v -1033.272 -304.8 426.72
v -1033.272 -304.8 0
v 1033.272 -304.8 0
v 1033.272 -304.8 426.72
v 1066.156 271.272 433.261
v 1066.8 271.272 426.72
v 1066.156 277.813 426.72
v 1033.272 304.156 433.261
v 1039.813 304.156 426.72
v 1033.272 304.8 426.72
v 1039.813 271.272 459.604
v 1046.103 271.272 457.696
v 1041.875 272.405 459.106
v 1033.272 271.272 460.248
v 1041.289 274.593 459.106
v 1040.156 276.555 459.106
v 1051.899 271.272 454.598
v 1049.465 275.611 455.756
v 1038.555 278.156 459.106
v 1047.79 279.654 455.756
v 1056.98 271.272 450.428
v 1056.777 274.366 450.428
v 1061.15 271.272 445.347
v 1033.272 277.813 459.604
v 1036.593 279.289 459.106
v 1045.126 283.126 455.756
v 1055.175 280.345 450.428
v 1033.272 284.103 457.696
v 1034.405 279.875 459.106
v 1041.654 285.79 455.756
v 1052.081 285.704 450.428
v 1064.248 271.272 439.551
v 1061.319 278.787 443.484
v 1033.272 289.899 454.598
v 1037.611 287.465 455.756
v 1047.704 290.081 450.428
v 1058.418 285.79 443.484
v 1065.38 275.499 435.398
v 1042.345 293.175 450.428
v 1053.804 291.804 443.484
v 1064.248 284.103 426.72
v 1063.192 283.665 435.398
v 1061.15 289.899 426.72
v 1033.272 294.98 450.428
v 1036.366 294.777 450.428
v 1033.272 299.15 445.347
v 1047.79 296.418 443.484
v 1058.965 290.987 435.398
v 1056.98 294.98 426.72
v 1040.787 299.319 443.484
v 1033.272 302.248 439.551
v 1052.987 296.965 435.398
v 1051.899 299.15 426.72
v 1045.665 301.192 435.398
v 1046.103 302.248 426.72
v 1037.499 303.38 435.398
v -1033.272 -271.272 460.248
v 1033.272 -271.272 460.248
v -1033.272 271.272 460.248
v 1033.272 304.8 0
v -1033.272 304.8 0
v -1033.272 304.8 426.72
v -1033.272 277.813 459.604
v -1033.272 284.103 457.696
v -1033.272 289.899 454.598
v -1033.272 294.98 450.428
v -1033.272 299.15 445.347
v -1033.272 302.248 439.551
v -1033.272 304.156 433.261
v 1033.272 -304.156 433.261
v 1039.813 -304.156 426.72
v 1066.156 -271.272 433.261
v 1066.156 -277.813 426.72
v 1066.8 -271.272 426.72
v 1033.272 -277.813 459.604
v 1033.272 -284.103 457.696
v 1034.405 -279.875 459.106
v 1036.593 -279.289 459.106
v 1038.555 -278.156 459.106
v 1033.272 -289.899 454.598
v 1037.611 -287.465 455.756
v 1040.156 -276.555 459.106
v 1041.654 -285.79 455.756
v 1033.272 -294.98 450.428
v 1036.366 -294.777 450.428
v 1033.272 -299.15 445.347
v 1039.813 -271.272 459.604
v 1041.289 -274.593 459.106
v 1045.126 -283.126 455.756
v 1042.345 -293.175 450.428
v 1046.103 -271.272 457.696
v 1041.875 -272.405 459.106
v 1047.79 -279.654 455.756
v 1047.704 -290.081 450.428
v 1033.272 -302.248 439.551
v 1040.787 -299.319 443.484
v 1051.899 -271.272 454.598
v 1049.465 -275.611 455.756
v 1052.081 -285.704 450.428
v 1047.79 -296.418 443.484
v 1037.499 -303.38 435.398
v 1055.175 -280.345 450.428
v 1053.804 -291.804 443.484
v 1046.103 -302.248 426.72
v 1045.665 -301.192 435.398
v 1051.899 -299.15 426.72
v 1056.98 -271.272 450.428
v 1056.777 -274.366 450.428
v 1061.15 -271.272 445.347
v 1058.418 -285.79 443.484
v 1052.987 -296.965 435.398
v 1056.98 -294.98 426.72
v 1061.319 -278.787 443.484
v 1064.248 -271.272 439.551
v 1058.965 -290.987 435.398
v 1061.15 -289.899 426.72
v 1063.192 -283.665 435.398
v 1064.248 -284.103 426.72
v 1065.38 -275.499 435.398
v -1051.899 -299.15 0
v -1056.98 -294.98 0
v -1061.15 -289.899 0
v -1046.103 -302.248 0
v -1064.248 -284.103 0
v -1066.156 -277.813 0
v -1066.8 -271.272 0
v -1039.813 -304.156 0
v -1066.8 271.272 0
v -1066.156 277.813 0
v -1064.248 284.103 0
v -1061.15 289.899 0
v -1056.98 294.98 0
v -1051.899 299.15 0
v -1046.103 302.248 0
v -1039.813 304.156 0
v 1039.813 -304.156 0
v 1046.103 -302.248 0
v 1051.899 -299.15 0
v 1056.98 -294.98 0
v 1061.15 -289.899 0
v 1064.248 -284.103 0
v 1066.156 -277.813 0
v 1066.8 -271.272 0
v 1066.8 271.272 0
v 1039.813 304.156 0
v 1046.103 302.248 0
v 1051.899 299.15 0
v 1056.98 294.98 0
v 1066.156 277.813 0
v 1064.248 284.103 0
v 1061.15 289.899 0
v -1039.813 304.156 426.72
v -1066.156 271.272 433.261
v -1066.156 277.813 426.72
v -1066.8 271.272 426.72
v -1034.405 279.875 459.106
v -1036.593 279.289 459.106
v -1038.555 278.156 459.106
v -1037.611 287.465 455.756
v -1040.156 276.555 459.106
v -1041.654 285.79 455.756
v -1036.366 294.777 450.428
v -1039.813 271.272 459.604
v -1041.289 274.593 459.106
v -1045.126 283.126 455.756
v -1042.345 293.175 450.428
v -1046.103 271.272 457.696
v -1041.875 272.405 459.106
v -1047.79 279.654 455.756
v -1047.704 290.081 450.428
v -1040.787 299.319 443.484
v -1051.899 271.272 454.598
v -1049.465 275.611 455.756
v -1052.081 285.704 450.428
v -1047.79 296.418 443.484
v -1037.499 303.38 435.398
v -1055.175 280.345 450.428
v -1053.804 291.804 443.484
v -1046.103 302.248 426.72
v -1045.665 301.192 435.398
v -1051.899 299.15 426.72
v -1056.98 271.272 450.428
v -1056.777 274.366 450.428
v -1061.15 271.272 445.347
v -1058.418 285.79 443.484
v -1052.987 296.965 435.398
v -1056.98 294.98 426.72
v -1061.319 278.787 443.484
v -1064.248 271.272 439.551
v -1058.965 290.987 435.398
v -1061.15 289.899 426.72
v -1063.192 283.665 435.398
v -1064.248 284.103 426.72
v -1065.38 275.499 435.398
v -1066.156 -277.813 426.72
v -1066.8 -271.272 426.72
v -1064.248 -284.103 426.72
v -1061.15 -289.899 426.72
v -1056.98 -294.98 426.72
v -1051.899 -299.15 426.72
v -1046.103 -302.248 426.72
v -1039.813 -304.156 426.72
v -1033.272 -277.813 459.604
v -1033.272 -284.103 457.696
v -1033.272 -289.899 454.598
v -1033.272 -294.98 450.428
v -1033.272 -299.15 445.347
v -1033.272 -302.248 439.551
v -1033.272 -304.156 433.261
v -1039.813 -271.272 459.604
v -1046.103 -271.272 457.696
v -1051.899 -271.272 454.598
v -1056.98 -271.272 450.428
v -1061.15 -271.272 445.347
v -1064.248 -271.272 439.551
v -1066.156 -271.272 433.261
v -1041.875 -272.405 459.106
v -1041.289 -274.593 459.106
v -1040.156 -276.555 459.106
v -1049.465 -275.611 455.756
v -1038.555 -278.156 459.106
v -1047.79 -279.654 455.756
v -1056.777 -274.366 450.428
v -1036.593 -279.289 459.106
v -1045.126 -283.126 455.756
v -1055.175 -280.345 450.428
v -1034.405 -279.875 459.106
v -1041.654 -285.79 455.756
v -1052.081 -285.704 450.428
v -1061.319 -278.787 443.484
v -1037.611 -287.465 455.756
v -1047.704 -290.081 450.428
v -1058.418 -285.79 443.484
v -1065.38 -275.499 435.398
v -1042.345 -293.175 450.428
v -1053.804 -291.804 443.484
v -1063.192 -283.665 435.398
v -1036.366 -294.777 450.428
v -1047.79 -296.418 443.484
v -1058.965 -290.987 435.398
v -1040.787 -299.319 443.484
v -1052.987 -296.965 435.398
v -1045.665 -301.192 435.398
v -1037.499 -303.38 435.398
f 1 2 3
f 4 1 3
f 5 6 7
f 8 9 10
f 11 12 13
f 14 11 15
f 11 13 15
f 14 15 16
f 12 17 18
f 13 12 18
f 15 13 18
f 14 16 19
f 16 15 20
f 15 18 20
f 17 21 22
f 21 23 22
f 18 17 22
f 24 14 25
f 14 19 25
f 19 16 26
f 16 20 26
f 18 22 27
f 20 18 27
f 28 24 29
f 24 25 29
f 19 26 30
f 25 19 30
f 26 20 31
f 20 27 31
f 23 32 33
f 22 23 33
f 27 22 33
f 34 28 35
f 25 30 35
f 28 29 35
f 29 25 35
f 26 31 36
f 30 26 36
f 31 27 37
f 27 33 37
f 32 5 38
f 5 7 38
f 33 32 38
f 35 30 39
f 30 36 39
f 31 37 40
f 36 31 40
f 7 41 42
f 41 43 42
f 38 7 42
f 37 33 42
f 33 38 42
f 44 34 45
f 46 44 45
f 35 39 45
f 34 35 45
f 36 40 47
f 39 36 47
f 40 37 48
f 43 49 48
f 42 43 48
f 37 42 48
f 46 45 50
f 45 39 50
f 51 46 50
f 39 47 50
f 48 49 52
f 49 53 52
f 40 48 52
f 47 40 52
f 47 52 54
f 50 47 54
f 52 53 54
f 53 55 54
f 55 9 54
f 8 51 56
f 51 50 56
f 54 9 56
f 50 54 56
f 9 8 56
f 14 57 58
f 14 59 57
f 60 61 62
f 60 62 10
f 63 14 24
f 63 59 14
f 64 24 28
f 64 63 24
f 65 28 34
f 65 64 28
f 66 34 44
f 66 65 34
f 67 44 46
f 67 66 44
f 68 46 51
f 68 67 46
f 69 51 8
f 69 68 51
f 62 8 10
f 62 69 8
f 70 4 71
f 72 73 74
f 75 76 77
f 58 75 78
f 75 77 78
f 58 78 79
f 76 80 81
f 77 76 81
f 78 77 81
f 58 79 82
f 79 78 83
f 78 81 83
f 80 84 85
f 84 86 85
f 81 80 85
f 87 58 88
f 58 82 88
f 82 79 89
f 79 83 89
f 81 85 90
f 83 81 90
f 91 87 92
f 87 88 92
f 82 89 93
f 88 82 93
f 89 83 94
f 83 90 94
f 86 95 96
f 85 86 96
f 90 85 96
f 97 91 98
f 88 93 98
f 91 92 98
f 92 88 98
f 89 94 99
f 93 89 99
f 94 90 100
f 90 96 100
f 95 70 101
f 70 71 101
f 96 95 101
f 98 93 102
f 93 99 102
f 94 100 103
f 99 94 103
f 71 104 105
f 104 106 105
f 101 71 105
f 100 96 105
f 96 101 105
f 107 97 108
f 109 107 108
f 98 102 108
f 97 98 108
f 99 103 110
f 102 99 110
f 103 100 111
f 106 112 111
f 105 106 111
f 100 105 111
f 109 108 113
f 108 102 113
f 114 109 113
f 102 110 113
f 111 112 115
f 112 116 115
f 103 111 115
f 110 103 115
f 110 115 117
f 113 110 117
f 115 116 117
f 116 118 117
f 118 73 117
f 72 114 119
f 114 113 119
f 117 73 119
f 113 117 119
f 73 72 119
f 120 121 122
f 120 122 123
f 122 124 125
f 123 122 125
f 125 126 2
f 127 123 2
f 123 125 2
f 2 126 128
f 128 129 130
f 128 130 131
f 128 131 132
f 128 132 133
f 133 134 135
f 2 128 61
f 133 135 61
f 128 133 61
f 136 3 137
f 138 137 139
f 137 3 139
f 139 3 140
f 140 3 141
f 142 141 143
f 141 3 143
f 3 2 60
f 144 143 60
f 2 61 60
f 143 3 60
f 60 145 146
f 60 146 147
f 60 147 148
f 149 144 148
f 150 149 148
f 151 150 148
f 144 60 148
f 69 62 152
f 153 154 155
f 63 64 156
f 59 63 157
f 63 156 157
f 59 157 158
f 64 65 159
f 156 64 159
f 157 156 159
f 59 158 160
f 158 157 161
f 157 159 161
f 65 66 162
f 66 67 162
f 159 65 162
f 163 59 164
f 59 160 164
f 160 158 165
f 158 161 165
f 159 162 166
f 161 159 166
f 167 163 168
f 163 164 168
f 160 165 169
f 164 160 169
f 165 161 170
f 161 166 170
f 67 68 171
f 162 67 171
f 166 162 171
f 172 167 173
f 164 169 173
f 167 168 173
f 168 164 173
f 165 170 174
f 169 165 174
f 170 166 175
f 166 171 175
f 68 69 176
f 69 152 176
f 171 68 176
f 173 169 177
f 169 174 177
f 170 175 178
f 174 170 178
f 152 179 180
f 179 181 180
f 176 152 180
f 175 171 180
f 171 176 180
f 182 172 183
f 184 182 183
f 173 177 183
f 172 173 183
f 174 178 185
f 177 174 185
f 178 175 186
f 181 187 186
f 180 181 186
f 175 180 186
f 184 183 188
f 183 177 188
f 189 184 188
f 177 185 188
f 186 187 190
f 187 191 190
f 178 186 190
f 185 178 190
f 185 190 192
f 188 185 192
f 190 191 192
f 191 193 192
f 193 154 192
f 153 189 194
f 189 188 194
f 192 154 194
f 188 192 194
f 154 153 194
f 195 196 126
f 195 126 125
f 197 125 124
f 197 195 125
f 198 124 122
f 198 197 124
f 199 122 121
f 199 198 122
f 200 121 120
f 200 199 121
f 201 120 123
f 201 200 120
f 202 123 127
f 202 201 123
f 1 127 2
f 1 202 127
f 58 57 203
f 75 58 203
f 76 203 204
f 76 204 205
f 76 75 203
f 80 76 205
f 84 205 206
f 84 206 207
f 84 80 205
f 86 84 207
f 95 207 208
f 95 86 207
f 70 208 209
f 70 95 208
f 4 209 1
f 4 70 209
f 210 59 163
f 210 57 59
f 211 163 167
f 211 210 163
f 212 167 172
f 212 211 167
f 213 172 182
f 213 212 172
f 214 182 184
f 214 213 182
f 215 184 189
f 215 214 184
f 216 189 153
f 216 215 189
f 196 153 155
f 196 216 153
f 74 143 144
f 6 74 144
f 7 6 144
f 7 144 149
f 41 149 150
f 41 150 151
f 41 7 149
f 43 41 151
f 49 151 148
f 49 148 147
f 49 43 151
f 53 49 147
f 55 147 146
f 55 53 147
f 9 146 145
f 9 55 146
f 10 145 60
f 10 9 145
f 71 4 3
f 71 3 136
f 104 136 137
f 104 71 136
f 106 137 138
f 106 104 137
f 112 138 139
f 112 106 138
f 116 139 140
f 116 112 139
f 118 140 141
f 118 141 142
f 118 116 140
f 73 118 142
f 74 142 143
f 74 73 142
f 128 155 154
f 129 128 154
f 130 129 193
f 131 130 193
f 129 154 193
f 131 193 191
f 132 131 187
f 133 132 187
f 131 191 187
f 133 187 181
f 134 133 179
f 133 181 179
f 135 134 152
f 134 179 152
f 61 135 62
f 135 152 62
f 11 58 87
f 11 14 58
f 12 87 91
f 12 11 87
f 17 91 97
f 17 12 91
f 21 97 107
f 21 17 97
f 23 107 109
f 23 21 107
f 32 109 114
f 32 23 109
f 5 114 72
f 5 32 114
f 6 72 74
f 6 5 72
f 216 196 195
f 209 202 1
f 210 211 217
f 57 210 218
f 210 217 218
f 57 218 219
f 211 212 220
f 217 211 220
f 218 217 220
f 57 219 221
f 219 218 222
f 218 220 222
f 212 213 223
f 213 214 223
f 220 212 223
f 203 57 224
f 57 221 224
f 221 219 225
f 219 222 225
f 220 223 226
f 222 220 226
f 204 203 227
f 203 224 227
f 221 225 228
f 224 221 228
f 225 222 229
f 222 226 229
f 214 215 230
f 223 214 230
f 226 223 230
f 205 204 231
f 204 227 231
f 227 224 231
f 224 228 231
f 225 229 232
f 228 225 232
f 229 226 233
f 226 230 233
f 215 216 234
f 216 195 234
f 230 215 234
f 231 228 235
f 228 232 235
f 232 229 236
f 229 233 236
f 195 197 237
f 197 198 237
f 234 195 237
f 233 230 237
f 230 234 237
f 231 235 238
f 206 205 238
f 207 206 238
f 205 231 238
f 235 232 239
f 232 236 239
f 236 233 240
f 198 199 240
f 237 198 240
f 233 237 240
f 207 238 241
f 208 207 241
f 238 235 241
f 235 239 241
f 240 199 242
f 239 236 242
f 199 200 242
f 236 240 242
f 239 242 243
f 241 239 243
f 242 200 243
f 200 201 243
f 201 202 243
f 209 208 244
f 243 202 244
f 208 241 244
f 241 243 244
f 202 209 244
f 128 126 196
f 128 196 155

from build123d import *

# Parameters (mm, degrees)
F0_W     = 2133.6
F0_H     = 609.6
F1_DEPTH = 460.248
F2_R     = 33.528
F3_R     = 33.528


with BuildPart() as f1:
    # F0 (on Top) → F1 (new body)
    with BuildSketch(Plane.XY):
        Rectangle(F0_W, F0_H)
    extrude(amount=F1_DEPTH)

    # F2
    f2_edges = [f1.edges().sort_by_distance(p)[0] for p in [
        (1066.8, -304.8, 230.124),
        (1066.8, 304.8, 230.124),
        (-1066.8, -304.8, 230.124),
        (-1066.8, 304.8, 230.124),
    ]]
    fillet(f2_edges, radius=F2_R)

    # F3
    f3_edges = [f1.edges().sort_by_distance(p)[0] for p in [
        (0, -304.8, 460.248),
    ]]
    fillet(f3_edges, radius=F3_R)


solid = f1.part
